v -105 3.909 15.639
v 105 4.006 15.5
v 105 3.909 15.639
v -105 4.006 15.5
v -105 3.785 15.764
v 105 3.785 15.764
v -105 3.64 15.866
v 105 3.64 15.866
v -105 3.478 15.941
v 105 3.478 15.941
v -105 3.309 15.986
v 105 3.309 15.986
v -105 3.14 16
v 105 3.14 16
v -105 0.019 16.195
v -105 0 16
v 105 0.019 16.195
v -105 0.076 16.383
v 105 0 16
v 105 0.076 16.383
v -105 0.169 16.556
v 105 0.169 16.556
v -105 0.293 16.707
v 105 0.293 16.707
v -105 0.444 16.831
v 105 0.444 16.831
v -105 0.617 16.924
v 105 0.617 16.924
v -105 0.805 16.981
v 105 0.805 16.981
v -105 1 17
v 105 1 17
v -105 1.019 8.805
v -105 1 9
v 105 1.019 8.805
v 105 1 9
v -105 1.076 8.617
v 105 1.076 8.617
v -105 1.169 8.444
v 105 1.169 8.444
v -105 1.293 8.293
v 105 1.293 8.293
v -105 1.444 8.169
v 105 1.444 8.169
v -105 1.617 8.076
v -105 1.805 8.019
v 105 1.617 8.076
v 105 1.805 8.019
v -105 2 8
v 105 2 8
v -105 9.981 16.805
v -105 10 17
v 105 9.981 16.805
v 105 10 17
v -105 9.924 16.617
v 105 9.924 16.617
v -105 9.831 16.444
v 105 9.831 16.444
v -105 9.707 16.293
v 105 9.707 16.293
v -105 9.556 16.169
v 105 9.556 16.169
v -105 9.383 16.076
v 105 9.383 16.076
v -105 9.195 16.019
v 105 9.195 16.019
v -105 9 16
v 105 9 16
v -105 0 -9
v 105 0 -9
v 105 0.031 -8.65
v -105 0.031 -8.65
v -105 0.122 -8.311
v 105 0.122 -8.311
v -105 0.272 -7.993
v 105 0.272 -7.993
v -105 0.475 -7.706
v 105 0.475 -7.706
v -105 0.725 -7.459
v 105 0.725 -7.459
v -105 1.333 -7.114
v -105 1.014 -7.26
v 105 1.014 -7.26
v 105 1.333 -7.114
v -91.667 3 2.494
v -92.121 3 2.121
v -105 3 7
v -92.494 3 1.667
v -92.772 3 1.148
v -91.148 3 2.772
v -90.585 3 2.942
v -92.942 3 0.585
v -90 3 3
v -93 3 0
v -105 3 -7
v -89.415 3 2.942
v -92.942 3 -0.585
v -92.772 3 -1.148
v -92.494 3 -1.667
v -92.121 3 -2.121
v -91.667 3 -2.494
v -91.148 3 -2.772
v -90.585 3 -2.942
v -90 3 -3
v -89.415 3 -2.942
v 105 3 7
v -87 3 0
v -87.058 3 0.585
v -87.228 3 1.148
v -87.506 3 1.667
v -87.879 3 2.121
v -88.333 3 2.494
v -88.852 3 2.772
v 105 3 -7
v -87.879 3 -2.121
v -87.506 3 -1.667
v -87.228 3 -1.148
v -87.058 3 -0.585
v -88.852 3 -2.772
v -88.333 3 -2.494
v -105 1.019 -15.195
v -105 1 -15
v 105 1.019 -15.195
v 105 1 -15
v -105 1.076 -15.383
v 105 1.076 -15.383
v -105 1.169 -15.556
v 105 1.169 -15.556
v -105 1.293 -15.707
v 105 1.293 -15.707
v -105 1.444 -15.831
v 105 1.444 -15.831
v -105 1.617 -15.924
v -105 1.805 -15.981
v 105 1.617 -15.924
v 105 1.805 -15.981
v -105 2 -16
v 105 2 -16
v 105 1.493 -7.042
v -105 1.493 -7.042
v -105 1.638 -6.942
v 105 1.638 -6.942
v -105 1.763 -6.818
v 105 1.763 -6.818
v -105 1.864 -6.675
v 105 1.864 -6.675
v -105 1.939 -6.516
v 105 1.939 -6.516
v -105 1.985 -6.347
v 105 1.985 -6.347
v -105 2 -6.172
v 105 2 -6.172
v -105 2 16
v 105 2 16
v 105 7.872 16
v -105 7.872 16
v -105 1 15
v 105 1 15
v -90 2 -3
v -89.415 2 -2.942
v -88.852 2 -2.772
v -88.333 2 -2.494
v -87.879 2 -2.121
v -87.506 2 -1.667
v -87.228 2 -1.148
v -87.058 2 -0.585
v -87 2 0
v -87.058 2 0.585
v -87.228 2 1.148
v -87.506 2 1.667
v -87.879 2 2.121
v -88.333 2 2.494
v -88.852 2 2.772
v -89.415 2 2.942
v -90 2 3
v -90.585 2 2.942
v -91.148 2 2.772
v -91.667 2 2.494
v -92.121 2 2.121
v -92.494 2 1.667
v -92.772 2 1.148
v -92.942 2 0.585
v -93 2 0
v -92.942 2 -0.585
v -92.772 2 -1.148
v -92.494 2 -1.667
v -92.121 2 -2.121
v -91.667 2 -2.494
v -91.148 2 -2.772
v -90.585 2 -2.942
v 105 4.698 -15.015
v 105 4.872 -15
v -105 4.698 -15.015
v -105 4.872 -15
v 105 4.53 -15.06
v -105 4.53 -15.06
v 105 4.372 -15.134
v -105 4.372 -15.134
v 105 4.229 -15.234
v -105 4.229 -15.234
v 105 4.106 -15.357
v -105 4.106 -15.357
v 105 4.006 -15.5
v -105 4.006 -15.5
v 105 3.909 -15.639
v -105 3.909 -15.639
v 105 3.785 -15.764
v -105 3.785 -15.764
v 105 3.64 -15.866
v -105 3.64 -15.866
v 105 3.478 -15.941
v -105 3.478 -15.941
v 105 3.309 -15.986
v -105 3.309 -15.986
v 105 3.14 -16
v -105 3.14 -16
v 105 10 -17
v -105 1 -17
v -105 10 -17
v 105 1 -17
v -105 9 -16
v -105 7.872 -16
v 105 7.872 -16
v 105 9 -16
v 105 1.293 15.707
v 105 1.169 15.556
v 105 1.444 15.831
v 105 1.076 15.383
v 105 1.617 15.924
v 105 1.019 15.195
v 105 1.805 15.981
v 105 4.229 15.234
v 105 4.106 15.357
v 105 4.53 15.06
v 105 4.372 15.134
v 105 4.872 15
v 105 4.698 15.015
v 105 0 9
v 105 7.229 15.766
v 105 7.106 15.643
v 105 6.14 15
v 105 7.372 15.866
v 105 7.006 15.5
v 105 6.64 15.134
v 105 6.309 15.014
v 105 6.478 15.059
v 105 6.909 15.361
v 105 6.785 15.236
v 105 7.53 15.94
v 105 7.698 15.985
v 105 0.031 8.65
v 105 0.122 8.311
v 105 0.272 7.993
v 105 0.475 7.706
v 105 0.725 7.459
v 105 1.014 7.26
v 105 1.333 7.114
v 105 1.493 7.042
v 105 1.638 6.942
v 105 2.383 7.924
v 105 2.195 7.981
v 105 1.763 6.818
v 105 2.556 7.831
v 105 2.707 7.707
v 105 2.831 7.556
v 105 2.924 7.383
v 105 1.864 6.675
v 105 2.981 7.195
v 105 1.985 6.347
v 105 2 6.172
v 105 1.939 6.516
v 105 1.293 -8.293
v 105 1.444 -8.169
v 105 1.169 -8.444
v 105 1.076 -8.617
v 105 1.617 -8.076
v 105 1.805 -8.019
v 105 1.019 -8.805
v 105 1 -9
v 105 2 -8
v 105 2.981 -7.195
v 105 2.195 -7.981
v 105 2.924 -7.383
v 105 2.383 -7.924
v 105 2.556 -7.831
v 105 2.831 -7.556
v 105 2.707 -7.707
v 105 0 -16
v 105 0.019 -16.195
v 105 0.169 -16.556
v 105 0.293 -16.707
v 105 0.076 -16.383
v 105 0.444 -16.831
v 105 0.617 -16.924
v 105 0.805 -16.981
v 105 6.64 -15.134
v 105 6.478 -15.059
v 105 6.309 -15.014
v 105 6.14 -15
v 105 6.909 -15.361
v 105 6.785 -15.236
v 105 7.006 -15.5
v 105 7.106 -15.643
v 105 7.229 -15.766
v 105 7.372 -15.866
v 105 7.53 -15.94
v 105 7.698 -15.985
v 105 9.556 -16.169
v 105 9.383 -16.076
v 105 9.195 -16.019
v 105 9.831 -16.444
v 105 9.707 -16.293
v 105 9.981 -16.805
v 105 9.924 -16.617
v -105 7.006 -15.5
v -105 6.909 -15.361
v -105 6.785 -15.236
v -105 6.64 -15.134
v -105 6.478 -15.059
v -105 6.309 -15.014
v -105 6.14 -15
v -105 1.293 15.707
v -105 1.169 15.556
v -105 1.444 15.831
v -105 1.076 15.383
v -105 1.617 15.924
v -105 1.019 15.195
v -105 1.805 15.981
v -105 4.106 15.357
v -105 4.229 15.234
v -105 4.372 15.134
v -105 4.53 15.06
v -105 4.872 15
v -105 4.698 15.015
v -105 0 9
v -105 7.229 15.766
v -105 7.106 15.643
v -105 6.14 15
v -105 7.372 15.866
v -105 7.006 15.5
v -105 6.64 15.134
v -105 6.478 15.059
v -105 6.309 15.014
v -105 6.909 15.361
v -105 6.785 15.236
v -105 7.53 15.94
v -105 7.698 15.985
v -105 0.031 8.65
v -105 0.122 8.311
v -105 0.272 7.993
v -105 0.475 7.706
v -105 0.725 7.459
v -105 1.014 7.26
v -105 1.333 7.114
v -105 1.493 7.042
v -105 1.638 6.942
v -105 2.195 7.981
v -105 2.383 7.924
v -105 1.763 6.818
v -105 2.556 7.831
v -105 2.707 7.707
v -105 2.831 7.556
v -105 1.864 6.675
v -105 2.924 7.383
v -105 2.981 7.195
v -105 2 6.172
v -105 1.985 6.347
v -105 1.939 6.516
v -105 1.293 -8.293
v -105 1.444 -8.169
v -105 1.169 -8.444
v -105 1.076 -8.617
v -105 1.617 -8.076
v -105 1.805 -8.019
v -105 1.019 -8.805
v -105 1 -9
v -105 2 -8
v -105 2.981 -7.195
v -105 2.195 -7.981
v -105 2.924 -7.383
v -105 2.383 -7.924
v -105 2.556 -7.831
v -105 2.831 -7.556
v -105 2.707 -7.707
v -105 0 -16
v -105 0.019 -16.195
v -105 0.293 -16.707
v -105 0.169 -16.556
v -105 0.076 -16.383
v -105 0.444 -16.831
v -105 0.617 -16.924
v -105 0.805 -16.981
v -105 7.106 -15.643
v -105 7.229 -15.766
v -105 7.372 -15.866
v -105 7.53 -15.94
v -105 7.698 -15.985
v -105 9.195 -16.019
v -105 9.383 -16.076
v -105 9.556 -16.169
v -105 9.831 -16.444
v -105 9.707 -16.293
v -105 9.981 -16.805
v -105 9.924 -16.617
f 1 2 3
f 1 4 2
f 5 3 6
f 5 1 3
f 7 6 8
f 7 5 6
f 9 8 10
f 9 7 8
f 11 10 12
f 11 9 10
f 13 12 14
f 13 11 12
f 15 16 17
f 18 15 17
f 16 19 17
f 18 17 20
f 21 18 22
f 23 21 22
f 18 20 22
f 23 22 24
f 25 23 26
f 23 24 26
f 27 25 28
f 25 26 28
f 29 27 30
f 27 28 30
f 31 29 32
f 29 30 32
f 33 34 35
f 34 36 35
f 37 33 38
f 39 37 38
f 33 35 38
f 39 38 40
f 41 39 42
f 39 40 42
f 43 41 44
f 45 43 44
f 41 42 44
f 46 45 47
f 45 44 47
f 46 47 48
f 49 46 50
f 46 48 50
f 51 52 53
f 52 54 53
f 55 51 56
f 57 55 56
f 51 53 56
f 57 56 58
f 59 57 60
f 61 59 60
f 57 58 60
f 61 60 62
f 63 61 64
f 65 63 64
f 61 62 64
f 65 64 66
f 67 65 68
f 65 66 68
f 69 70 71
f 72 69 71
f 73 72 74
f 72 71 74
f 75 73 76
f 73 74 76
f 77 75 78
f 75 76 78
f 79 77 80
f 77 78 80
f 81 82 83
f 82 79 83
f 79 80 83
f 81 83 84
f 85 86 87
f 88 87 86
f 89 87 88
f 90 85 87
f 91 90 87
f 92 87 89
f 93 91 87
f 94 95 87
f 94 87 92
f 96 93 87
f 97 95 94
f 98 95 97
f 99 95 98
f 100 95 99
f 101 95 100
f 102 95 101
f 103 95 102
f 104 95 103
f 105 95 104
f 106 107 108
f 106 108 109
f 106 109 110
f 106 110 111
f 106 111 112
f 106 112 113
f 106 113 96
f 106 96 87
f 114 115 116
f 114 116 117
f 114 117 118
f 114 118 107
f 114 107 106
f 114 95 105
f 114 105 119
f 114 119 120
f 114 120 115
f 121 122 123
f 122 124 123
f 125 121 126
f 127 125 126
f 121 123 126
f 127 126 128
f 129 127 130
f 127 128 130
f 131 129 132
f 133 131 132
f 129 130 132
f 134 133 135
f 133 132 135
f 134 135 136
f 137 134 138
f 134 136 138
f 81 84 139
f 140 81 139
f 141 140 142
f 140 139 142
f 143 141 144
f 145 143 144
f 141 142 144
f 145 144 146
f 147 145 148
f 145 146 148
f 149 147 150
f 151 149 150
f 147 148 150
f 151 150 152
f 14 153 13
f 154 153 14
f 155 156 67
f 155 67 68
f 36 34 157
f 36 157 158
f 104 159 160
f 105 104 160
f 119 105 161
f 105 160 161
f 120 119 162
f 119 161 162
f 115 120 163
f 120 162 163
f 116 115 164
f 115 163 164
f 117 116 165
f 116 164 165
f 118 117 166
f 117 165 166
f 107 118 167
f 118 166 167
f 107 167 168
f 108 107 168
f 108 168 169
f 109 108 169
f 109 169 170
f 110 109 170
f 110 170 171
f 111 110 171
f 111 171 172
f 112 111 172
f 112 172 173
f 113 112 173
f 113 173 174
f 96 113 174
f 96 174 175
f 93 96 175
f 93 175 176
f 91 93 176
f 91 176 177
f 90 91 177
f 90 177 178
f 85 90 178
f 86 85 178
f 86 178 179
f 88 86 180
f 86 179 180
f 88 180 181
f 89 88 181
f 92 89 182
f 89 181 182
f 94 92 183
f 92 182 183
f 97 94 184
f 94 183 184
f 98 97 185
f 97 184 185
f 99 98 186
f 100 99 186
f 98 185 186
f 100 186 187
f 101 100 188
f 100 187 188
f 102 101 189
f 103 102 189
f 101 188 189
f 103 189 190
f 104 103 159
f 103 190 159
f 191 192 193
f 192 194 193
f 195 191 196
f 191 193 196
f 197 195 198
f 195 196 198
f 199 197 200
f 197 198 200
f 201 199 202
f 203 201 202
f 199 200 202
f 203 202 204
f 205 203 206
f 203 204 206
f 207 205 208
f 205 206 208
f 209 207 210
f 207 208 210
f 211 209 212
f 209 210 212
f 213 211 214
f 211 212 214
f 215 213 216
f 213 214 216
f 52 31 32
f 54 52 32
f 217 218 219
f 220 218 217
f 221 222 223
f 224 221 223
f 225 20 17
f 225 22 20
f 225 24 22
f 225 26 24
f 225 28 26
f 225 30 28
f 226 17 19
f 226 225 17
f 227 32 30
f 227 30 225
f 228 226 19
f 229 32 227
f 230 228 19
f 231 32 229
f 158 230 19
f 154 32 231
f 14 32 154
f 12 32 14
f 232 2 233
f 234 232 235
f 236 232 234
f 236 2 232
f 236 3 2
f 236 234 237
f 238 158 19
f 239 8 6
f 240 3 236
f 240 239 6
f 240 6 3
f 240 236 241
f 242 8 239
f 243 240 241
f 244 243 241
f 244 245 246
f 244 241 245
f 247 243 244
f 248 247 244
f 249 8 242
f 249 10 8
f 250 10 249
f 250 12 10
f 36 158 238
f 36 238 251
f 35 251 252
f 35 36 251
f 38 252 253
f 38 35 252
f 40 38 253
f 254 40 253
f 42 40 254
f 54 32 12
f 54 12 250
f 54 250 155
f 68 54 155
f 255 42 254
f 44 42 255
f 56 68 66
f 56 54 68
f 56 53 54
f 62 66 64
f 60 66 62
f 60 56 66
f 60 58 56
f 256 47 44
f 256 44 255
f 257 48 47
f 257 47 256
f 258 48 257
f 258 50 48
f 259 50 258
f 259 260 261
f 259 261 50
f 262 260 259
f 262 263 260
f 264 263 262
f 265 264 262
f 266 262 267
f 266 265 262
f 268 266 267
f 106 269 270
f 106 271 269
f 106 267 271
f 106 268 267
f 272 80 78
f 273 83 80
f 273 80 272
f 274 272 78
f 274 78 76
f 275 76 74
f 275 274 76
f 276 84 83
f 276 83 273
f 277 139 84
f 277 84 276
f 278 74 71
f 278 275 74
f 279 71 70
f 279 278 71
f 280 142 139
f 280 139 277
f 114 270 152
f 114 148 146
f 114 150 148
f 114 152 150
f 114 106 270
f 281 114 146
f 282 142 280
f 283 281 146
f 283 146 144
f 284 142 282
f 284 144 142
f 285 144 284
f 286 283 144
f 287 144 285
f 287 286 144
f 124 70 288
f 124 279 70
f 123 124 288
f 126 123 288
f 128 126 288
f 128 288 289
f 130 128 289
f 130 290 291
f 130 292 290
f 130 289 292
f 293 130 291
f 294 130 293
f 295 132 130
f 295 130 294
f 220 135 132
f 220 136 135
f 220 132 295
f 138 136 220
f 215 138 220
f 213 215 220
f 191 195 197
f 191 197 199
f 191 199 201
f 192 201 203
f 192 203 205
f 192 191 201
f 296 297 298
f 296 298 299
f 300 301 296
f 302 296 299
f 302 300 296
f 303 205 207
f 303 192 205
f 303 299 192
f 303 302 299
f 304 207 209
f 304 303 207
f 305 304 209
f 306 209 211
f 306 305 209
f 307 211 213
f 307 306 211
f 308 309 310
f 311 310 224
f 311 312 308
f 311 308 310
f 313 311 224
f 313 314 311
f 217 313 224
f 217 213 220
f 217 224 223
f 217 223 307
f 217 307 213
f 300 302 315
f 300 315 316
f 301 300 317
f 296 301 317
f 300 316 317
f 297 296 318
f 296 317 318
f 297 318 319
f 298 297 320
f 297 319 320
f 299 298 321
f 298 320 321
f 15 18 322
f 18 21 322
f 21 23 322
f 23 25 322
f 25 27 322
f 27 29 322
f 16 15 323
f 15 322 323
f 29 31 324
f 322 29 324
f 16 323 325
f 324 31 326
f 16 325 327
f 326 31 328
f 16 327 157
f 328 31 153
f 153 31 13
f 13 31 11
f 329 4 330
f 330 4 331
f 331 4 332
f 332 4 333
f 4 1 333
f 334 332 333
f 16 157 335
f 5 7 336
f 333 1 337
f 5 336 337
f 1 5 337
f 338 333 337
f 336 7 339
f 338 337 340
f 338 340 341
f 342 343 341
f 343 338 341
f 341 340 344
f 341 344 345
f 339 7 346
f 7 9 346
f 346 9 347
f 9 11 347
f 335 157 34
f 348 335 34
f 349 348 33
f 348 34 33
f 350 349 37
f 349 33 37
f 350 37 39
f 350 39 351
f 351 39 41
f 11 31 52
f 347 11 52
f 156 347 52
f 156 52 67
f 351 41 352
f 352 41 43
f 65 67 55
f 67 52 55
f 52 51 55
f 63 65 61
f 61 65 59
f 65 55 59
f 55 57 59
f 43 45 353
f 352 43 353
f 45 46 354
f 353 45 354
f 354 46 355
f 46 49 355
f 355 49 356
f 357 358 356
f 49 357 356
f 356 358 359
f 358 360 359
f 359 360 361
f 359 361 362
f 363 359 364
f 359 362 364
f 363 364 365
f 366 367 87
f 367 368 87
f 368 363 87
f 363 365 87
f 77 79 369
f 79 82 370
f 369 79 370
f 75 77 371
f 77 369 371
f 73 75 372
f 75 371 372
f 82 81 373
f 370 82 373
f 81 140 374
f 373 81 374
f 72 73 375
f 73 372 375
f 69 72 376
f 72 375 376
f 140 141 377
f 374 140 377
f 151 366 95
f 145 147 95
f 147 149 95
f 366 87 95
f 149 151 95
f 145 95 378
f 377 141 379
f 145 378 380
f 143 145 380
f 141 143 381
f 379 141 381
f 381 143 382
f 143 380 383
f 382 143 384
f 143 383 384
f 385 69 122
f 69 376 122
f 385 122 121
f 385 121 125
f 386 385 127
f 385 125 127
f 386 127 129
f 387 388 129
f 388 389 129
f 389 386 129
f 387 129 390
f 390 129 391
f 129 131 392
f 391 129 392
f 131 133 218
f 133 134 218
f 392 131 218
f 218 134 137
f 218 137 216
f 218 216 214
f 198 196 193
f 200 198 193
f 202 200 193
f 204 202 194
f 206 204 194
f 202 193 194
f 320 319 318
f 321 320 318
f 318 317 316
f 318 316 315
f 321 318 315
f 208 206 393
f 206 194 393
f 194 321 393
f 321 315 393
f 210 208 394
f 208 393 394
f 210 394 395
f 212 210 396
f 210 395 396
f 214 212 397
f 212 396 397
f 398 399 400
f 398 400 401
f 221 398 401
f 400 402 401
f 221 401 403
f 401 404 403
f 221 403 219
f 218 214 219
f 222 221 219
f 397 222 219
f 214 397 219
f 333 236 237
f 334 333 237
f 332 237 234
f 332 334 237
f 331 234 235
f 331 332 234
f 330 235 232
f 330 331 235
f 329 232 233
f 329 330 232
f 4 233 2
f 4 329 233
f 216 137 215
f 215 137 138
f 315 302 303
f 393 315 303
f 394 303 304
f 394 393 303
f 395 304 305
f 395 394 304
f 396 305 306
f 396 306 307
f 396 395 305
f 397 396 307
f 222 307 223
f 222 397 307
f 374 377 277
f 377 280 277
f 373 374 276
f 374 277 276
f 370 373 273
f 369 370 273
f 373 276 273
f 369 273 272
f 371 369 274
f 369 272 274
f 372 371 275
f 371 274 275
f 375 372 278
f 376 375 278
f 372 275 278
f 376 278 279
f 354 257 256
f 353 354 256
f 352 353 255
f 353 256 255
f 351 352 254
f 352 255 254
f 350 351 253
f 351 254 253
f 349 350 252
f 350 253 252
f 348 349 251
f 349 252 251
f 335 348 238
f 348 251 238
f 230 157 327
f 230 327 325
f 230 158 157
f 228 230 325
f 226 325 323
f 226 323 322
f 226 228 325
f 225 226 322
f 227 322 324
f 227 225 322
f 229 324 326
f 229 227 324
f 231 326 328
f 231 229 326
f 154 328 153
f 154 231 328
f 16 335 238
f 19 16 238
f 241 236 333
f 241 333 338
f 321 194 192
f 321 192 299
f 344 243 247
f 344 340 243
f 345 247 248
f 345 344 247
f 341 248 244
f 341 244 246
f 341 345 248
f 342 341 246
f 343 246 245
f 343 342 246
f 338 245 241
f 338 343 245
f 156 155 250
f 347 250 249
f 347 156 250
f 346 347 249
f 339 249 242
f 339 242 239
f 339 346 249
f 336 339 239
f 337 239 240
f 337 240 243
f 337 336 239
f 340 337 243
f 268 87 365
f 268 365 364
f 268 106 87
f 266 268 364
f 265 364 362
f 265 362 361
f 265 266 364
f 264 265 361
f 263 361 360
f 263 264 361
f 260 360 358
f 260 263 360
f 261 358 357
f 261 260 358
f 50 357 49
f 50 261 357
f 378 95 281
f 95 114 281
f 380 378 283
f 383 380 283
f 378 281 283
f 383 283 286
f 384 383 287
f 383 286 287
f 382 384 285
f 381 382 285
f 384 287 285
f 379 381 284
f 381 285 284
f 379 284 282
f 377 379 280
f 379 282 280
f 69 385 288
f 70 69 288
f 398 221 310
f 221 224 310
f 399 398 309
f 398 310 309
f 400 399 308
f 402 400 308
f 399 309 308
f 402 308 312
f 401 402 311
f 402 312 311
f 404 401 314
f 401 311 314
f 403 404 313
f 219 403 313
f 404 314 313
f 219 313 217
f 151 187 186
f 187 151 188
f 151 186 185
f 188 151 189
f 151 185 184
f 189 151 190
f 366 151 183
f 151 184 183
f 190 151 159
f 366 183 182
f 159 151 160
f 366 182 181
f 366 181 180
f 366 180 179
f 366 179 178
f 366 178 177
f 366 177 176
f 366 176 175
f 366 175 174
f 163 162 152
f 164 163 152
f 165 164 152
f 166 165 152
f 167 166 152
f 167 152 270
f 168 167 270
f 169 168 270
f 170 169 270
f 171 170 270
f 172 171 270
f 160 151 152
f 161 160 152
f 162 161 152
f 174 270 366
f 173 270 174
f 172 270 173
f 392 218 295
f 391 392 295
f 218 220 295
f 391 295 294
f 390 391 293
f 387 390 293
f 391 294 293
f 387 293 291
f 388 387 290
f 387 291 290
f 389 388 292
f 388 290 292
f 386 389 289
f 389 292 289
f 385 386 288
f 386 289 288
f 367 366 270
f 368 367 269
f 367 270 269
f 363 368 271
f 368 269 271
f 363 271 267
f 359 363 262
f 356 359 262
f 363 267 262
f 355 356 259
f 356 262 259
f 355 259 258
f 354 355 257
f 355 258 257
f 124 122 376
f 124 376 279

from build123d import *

# Parameters (mm, degrees)
SKETCH1_W           = 210
SKETCH1_H           = 34
BOSS_EXTRUDE1_DEPTH = 1
SKETCH2_W           = 210
SKETCH2_H           = 1
BOSS_EXTRUDE2_DEPTH = 9
SKETCH3_W           = 210
SKETCH3_H           = 16
BOSS_EXTRUDE3_DEPTH = 2
FILLET1_R           = 1
FILLET2_R           = 1
FILLET3_R           = 1
FILLET4_R           = 1
FILLET5_R           = 1
FILLET6_R           = 1
CUT_EXTRUDE1_DEPTH  = 211.924156985
FILLET7_R           = 1
FILLET8_R           = 1
FILLET9_R           = 1
FILLET10_R          = 1
SKETCH5_W           = 3
SKETCH5_H           = 3
BOSS_EXTRUDE4_DEPTH = 210
FILLET11_R          = 1
FILLET12_R          = 1
FILLET13_R          = 1
FILLET14_R          = 1
FILLET15_R          = 1
FILLET16_R          = 1
FILLET17_R          = 1
FILLET18_R          = 1
SKETCH6_W           = 1
SKETCH6_H           = 3
CUT_EXTRUDE2_DEPTH  = 210
SKETCH7_R           = 3
CUT_EXTRUDE3_DEPTH  = 10


with BuildPart() as part:
    # Sketch1 → Boss-Extrude1 (new body)
    with BuildSketch(Plane(origin=(0, 0, 0), x_dir=(1, 0, 0), z_dir=(0, 1, 0))):
        Rectangle(SKETCH1_W, SKETCH1_H)
    extrude(amount=BOSS_EXTRUDE1_DEPTH)

    # Sketch2 → Boss-Extrude2 (add)
    with BuildSketch(Plane(origin=(0, 1, 0), x_dir=(1, 0, 0), z_dir=(0, 1, 0))):
        with Locations((0, 16.5)):
            Rectangle(SKETCH2_W, SKETCH2_H)
        with Locations((0, -16.5)):
            Rectangle(SKETCH2_W, SKETCH2_H)
    extrude(amount=BOSS_EXTRUDE2_DEPTH)

    # Sketch3 → Boss-Extrude3 (add)
    with BuildSketch(Plane(origin=(0, 1, 0), x_dir=(1, 0, 0), z_dir=(0, 1, 0))):
        Rectangle(SKETCH3_W, SKETCH3_H)
    extrude(amount=BOSS_EXTRUDE3_DEPTH)

    # Fillet1
    fillet1_edges = [part.edges().sort_by_distance(p)[0] for p in [
        (0, 1, 8),
    ]]
    fillet(fillet1_edges, radius=FILLET1_R)

    # Fillet2
    fillet2_edges = [part.edges().sort_by_distance(p)[0] for p in [
        (0, 1, -8),
    ]]
    fillet(fillet2_edges, radius=FILLET2_R)

    # Fillet3
    fillet3_edges = [part.edges().sort_by_distance(p)[0] for p in [
        (0, 1, 16),
    ]]
    fillet(fillet3_edges, radius=FILLET3_R)

    # Fillet4
    fillet4_edges = [part.edges().sort_by_distance(p)[0] for p in [
        (0, 1, -16),
    ]]
    fillet(fillet4_edges, radius=FILLET4_R)

    # Fillet5
    fillet5_edges = [part.edges().sort_by_distance(p)[0] for p in [
        (0, 10, -16),
    ]]
    fillet(fillet5_edges, radius=FILLET5_R - 0.0001)  # a hair under: the kernel refuses the full size

    # Fillet6
    fillet6_edges = [part.edges().sort_by_distance(p)[0] for p in [
        (0, 10, 16),
    ]]
    fillet(fillet6_edges, radius=FILLET6_R - 0.0001)  # a hair under: the kernel refuses the full size

    # Sketch4 → Cut-Extrude1 (cut, through all)
    with BuildSketch(Plane(origin=(105, 0, 0), x_dir=(0, 0, -1), z_dir=(1, 0, 0))):
        with BuildLine():
            Line((-9, 0), (9, 0))
            ThreePointArc((9, 0), (7.845299462, 0.367006838), (7.114381917, 1.333333333))
            ThreePointArc((7.114381917, 1.333333333), (6.748923144, 1.816496581), (6.171572875, 2))
            Line((6.171572875, 2), (-6.171572875, 2))
            ThreePointArc((-6.171572875, 2), (-6.748923144, 1.816496581), (-7.114381917, 1.333333333))
            ThreePointArc((-7.114381917, 1.333333333), (-7.845299462, 0.367006838), (-9, 0))
        make_face()
    extrude(amount=-CUT_EXTRUDE1_DEPTH, mode=Mode.SUBTRACT)

    # Fillet7
    fillet7_edges = [part.edges().sort_by_distance(p)[0] for p in [
        (0, 3, 8),
    ]]
    fillet(fillet7_edges, radius=FILLET7_R - 0.0001)  # a hair under: the kernel refuses the full size

    # Fillet8
    fillet8_edges = [part.edges().sort_by_distance(p)[0] for p in [
        (0, 3, -8),
    ]]
    fillet(fillet8_edges, radius=FILLET8_R - 0.0001)  # a hair under: the kernel refuses the full size

    # Fillet9
    fillet9_edges = [part.edges().sort_by_distance(p)[0] for p in [
        (0, 0, -17),
    ]]
    fillet(fillet9_edges, radius=FILLET9_R)

    # Fillet10
    fillet10_edges = [part.edges().sort_by_distance(p)[0] for p in [
        (0, 0, 17),
    ]]
    fillet(fillet10_edges, radius=FILLET10_R)

    # Sketch5 → Boss-Extrude4 (add)
    with BuildSketch(Plane(origin=(105, 0, 0), x_dir=(0, 0, -1), z_dir=(1, 0, 0))):
        with Locations((-16.5, 5.371770908)):
            Rectangle(SKETCH5_W, SKETCH5_H)
        with Locations((16.5, 5.371770908)):
            Rectangle(SKETCH5_W, SKETCH5_H)
    extrude(amount=-BOSS_EXTRUDE4_DEPTH)

    # Fillet11
    fillet11_edges = [part.edges().sort_by_distance(p)[0] for p in [
        (0, 6.871770908, 16),
    ]]
    fillet(fillet11_edges, radius=FILLET11_R - 0.0001)  # a hair under: the kernel refuses the full size

    # Fillet12
    fillet12_edges = [part.edges().sort_by_distance(p)[0] for p in [
        (0, 6.871770908, 15),
    ]]
    fillet(fillet12_edges, radius=FILLET12_R)

    # Fillet13
    fillet13_edges = [part.edges().sort_by_distance(p)[0] for p in [
        (0, 3.871770908, 15),
    ]]
    fillet(fillet13_edges, radius=FILLET13_R - 0.0001)  # a hair under: the kernel refuses the full size

    # Fillet14
    fillet14_edges = [part.edges().sort_by_distance(p)[0] for p in [
        (0, 3.871770908, 16),
    ]]
    fillet(fillet14_edges, radius=FILLET14_R)

    # Fillet15
    fillet15_edges = [part.edges().sort_by_distance(p)[0] for p in [
        (0, 6.871770908, -16),
    ]]
    fillet(fillet15_edges, radius=FILLET15_R - 0.0001)  # a hair under: the kernel refuses the full size

    # Fillet16
    fillet16_edges = [part.edges().sort_by_distance(p)[0] for p in [
        (0, 6.871770908, -15),
    ]]
    fillet(fillet16_edges, radius=FILLET16_R)

    # Fillet17
    fillet17_edges = [part.edges().sort_by_distance(p)[0] for p in [
        (0, 3.871770908, -15),
    ]]
    fillet(fillet17_edges, radius=FILLET17_R - 0.0001)  # a hair under: the kernel refuses the full size

    # Fillet18
    fillet18_edges = [part.edges().sort_by_distance(p)[0] for p in [
        (0, 3.871770908, -16),
    ]]
    fillet(fillet18_edges, radius=FILLET18_R)

    # Sketch6 → Cut-Extrude2 (cut)
    with BuildSketch(Plane(origin=(105, 0, 0), x_dir=(0, 0, -1), z_dir=(1, 0, 0))):
        with Locations((-17.5, 5.371770908)):
            Rectangle(SKETCH6_W, SKETCH6_H)
        with Locations((17.5, 5.371770908)):
            Rectangle(SKETCH6_W, SKETCH6_H)
    extrude(amount=-CUT_EXTRUDE2_DEPTH, mode=Mode.SUBTRACT)

    # Sketch7 → Cut-Extrude3 (cut)
    with BuildSketch(Plane.XZ.offset(-2)):
        with Locations(Location((-90, 0, 0), (0, 0, 270))):
            Circle(SKETCH7_R)
    extrude(amount=-CUT_EXTRUDE3_DEPTH, mode=Mode.SUBTRACT)


solid = part.part
